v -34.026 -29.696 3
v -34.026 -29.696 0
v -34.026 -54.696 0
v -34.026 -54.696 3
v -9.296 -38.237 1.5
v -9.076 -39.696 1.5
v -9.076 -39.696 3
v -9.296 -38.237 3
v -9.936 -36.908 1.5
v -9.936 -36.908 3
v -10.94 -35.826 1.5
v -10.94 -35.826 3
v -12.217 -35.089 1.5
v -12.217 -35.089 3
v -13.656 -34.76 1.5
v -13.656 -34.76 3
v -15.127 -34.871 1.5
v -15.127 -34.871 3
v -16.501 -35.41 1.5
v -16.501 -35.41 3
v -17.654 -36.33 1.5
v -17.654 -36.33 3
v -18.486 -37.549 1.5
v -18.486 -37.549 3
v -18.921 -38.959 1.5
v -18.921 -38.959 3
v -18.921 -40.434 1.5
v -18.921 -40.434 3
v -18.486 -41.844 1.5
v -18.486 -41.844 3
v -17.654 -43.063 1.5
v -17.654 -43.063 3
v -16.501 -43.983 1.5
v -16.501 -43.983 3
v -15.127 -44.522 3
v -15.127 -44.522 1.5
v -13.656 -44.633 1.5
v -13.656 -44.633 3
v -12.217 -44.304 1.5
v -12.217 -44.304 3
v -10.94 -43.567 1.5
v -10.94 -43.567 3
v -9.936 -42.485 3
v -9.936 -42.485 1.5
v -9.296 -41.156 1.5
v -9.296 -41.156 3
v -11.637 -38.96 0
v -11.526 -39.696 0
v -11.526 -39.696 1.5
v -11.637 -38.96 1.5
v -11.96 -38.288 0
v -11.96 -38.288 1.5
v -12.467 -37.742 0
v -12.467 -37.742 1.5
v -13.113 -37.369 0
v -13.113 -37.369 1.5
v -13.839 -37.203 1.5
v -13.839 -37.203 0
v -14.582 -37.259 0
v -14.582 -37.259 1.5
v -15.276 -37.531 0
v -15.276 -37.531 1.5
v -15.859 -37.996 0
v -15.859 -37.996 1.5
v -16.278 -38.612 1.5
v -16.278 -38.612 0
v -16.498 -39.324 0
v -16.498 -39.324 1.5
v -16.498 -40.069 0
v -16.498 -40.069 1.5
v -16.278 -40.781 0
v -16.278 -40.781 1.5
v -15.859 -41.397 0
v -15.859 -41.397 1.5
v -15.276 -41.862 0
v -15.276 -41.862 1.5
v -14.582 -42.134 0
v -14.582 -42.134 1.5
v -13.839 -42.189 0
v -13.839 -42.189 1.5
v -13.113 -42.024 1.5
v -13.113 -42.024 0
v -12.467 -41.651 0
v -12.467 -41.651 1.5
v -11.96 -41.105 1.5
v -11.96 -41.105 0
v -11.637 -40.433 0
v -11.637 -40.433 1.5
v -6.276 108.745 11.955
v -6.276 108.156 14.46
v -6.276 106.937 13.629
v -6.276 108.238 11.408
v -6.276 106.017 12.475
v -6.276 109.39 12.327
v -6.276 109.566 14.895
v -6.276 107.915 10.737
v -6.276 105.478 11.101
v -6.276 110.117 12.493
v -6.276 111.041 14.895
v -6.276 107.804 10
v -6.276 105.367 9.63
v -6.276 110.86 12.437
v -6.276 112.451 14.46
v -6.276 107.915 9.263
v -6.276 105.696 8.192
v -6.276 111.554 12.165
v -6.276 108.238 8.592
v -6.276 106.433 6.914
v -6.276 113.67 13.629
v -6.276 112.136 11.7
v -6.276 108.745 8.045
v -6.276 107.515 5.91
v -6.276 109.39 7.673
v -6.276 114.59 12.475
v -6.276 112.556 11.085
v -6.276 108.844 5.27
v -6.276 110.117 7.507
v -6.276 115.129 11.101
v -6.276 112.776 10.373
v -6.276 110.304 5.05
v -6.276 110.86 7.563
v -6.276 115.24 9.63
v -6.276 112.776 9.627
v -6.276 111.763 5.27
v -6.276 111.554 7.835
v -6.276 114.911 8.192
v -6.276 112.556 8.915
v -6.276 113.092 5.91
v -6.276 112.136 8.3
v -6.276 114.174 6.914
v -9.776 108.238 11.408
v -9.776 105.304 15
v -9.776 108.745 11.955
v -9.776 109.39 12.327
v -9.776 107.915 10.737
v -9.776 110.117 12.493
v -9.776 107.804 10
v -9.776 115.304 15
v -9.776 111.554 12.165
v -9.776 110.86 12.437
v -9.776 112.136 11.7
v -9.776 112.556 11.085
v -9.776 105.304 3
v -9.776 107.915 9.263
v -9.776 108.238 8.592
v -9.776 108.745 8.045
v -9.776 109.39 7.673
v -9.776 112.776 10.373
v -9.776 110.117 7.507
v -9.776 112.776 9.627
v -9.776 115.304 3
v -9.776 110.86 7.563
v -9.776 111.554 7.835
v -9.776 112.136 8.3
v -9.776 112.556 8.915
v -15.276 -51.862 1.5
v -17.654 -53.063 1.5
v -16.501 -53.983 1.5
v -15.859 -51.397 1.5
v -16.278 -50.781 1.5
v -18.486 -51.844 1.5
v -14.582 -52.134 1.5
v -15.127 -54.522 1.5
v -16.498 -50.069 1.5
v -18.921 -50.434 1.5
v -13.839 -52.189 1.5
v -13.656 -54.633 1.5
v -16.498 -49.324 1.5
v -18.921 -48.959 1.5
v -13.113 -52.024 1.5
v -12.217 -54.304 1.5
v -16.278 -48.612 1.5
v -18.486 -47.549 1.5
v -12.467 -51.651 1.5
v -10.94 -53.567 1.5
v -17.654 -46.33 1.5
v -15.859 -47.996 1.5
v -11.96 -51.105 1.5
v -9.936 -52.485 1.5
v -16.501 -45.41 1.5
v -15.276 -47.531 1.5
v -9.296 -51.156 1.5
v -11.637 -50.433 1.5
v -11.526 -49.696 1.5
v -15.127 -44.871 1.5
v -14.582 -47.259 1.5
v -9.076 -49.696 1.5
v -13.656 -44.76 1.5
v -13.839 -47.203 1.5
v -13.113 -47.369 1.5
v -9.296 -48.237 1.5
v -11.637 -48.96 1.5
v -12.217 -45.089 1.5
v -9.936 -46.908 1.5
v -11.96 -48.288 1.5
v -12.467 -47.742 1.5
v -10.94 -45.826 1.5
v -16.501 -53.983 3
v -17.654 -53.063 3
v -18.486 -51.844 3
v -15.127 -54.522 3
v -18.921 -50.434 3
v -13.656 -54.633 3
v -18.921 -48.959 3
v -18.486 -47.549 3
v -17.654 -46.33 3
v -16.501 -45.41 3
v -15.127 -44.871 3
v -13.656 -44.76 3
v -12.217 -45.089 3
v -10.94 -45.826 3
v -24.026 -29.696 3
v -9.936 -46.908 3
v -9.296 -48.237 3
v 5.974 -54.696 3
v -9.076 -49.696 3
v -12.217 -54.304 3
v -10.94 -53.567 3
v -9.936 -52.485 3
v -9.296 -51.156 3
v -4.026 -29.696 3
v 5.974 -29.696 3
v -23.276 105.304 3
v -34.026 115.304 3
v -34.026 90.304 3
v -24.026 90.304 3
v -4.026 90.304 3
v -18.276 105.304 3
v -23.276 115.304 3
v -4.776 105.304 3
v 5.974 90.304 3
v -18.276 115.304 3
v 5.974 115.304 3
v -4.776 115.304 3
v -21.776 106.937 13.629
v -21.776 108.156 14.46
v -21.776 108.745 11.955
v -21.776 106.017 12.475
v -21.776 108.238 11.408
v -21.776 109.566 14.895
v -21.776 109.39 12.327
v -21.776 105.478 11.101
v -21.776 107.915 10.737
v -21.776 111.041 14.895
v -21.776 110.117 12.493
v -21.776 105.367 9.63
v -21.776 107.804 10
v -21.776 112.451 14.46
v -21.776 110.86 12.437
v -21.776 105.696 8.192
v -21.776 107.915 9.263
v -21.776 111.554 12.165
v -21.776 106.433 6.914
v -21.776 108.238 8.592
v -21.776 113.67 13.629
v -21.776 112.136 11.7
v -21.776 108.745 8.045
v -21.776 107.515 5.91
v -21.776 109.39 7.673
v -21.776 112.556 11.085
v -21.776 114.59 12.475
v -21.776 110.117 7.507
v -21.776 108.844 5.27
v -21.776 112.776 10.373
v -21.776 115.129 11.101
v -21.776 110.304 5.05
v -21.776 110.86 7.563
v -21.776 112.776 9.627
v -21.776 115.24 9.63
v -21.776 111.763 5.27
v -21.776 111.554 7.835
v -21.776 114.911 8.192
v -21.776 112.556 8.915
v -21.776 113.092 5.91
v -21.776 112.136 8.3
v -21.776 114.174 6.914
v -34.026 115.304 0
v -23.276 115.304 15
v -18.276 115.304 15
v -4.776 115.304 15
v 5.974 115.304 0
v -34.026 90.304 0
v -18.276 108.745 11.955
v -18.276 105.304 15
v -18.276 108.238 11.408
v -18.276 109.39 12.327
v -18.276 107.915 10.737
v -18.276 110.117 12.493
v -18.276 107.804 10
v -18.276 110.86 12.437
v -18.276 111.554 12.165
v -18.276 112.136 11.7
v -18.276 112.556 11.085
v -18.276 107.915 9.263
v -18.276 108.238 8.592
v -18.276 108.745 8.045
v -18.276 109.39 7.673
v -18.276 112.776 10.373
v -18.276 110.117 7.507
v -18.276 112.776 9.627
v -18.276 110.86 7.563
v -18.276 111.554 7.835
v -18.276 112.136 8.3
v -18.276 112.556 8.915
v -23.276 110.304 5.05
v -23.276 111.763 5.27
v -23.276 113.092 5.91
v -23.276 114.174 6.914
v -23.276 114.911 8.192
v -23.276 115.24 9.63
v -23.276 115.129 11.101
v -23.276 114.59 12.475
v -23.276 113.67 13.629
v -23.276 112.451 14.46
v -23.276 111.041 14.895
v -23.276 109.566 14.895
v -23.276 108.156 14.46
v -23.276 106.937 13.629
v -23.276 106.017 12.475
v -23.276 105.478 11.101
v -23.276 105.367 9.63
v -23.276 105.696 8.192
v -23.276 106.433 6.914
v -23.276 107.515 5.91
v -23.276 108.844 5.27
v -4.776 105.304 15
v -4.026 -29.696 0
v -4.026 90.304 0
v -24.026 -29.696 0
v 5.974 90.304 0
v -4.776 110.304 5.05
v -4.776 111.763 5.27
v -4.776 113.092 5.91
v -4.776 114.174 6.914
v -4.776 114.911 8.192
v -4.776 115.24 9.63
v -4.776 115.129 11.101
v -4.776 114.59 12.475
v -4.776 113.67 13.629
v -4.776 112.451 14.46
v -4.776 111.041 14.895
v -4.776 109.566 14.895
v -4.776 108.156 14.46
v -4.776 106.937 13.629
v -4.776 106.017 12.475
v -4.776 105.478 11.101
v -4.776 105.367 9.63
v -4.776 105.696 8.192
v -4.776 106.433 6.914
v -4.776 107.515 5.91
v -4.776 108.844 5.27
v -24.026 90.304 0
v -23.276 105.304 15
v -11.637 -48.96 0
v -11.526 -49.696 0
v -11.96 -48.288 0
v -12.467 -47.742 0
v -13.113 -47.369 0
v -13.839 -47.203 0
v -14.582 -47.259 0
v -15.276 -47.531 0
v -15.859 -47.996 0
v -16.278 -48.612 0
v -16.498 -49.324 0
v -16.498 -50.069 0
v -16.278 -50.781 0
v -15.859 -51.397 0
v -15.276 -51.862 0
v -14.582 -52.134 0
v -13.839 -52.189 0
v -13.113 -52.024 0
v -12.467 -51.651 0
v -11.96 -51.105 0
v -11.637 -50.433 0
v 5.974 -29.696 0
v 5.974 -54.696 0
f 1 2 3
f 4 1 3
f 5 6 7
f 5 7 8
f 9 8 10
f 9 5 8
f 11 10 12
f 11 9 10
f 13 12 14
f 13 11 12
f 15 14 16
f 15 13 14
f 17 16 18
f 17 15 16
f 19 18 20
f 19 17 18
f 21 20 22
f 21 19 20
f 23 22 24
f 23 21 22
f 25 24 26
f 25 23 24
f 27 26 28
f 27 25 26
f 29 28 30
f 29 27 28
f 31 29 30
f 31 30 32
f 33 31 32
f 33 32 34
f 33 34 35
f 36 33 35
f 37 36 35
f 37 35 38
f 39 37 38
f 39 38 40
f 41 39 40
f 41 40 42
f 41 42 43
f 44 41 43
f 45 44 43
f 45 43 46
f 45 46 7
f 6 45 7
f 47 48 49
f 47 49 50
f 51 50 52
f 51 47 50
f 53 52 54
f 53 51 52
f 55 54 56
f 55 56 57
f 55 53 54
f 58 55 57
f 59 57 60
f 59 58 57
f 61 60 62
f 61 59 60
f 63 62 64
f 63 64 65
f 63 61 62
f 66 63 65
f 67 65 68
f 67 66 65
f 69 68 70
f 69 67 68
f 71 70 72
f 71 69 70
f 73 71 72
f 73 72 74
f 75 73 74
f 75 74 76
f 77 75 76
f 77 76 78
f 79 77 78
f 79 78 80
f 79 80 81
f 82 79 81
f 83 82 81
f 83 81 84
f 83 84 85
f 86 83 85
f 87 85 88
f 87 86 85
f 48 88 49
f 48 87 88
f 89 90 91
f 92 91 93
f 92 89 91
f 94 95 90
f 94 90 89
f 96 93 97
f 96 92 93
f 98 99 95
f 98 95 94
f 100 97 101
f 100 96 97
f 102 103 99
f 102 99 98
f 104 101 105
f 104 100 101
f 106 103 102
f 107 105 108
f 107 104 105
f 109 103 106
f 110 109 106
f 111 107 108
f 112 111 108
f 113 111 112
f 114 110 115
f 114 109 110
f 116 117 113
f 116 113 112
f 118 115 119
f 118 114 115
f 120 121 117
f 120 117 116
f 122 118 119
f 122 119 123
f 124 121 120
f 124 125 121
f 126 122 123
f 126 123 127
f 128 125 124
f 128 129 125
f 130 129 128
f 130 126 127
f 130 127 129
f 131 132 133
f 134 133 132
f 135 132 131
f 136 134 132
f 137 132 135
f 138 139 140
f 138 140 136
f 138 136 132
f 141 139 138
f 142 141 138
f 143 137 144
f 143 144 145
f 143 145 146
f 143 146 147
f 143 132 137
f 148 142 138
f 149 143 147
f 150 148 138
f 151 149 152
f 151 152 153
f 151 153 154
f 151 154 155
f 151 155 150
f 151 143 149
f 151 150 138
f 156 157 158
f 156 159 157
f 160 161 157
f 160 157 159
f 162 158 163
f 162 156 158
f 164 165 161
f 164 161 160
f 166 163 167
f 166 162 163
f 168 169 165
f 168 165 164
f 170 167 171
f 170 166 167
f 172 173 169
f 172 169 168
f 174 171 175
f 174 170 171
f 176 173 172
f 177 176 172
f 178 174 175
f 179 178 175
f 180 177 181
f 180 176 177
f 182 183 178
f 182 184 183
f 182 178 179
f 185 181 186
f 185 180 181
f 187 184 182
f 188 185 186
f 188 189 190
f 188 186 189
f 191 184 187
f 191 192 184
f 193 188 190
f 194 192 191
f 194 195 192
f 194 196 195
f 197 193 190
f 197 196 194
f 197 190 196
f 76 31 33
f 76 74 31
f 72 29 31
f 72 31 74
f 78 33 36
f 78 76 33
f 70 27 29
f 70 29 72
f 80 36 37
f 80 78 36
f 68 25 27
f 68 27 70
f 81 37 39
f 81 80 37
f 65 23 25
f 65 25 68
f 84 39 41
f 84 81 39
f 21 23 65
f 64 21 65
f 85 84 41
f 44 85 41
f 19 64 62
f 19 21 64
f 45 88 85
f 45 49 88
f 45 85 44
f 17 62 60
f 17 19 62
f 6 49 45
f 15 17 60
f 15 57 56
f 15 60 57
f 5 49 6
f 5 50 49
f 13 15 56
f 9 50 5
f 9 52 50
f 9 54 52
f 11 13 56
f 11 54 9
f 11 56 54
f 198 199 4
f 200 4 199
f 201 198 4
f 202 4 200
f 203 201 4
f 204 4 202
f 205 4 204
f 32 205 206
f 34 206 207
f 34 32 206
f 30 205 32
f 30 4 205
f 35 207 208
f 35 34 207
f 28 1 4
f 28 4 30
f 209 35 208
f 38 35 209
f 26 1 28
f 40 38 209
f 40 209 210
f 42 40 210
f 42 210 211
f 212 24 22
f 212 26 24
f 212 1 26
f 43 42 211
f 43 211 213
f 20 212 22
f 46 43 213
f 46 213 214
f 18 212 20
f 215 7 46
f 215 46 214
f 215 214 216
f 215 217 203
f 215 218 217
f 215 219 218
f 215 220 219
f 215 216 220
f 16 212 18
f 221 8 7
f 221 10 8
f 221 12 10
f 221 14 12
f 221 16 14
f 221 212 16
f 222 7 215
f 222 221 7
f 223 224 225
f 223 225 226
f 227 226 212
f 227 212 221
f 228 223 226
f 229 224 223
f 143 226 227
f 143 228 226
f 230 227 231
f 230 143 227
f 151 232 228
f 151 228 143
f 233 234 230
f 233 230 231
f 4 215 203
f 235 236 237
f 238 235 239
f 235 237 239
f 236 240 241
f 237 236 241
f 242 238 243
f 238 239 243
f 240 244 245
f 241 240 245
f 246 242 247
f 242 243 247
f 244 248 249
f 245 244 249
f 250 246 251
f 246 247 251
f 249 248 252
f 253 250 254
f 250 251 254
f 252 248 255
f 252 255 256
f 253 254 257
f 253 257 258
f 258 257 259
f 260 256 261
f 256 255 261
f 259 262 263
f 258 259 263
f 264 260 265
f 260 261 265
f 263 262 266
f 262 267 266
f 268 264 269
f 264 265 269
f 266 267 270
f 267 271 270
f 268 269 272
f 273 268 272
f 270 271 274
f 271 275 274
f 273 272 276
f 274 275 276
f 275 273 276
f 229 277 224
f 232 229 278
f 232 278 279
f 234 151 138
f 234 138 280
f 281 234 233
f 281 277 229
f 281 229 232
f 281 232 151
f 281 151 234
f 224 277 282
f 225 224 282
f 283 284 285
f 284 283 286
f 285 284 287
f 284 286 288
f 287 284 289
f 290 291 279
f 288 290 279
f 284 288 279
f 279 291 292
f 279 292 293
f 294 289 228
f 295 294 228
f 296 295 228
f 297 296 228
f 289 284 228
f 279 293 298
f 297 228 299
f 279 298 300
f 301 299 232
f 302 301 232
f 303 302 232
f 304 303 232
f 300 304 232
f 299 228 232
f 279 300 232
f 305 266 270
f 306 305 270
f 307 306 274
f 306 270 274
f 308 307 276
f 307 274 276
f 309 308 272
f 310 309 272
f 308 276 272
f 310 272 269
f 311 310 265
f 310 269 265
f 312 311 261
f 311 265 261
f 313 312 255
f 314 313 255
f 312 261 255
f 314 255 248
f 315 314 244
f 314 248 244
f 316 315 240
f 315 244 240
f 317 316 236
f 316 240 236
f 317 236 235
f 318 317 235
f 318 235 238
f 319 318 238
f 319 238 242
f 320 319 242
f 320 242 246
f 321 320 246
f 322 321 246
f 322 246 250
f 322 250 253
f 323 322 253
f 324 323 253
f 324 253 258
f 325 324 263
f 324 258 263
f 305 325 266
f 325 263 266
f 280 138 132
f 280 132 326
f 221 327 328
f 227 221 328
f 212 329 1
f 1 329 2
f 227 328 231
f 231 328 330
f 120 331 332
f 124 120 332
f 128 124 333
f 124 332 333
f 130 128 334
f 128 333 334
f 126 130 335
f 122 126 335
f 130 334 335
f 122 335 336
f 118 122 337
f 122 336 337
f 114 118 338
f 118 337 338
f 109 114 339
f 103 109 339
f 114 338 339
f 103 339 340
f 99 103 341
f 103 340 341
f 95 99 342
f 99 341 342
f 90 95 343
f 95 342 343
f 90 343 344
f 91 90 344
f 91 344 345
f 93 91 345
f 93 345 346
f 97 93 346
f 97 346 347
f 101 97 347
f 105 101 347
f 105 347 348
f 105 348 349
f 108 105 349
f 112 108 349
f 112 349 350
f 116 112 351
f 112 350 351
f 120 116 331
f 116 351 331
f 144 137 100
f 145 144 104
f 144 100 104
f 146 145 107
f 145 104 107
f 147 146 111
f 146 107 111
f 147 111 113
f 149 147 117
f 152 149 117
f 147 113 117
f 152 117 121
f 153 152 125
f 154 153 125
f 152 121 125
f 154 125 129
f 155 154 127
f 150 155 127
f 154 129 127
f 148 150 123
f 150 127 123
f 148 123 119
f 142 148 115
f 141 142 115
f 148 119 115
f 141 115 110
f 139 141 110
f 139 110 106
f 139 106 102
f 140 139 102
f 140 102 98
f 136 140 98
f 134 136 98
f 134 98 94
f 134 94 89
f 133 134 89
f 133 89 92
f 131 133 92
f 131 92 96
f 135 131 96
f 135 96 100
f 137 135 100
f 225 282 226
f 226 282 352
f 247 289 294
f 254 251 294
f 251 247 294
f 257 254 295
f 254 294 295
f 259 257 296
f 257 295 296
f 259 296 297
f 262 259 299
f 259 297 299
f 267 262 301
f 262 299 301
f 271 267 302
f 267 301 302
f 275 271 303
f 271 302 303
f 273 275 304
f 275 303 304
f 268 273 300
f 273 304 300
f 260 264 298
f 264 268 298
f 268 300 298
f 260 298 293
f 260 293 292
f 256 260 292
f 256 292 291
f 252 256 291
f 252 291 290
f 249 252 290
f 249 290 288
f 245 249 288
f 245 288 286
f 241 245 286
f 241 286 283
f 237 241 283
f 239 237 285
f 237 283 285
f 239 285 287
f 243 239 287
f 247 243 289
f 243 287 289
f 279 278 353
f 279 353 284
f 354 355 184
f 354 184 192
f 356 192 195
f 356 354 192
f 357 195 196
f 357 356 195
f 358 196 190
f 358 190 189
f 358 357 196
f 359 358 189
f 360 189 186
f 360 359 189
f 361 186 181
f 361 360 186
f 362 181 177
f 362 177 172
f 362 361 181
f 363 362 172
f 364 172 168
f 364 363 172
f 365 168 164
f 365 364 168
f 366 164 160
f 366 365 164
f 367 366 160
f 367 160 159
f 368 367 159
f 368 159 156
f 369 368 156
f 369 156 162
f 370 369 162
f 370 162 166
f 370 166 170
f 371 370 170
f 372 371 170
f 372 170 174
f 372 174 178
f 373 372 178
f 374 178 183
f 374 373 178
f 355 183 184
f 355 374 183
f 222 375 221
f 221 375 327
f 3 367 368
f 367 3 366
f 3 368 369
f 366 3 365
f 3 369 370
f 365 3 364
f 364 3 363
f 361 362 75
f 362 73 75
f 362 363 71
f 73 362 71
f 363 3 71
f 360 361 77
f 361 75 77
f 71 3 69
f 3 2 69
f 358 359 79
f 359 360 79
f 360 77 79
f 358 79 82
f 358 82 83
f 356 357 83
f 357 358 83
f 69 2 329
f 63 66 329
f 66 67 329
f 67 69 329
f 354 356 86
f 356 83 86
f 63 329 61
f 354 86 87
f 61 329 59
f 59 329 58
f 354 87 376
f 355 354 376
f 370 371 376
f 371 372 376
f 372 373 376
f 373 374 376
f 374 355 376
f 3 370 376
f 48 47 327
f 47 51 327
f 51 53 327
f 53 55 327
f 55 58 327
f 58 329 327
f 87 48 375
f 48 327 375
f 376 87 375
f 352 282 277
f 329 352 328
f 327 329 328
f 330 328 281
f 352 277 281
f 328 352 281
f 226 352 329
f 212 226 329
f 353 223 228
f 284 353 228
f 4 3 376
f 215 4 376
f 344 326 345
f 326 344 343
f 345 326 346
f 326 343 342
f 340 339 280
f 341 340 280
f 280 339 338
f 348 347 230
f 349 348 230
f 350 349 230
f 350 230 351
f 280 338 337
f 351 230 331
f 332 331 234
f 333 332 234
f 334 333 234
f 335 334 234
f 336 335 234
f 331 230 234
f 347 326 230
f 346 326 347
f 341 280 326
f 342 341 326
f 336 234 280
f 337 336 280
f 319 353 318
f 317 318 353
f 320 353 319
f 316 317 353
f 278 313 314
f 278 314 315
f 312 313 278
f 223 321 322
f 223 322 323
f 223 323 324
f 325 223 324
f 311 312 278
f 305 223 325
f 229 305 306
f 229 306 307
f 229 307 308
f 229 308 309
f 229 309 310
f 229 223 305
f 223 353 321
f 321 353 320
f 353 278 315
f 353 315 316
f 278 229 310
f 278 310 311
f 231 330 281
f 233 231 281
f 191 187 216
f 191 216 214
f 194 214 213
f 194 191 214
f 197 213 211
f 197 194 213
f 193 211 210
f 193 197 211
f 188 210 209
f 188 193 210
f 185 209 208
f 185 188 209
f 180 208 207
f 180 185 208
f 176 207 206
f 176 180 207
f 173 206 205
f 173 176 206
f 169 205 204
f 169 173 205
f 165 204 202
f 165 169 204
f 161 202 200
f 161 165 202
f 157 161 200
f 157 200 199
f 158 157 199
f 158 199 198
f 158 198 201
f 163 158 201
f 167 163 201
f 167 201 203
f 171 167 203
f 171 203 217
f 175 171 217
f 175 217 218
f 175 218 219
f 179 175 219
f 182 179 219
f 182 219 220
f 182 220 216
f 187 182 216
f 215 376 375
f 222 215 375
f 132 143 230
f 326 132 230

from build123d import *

# Parameters (mm, degrees)
SKETCH1_R             = 4.95
SKETCH1_W             = 5
SKETCH1_H             = 10
SKETCH1_W_2           = 8.5
BODY_DEPTH            = 3
SKETCH1_3_R           = 4.95
SKETCH1_3_R_2         = 2.5
MOUNT_INSETS_DEPTH    = 1.5
SKETCH1_5_W           = 5
SKETCH1_5_H           = 10
HINGE_DEPTH           = 15
SKETCH2_R             = 4.95
SKETCH2_R_2           = 2.5
HINGE_INSET_DEPTH     = 1.5
HINGE_START           = -17
SKETCH2_2_R           = 4.95
SKETCH2_2_R_2         = 2.5
HINGE_INSET2_DEPTH    = 1.5
SKETCH2_3_R           = 2.5
HINGE_SCREWHOLE_DEPTH = 120.897733068


with BuildPart() as part:
    # Sketch1 → Body (new body)
    # profile 1 of 4: a face of its own
    with BuildSketch(Plane.XY):
        Polygon((-23.27588231, 115.303529412), (-34.02588231, 115.303529412), (-34.02588231, 90.303529412), (-24.02588231, 90.303529412), (-24.02588231, -29.696470588), (-34.02588231, -29.696470588), (-34.02588231, -54.696470588), (5.97411769, -54.696470588), (5.97411769, -29.696470588), (-4.02588231, -29.696470588), (-4.02588231, 90.303529412), (5.97411769, 90.303529412), (5.97411769, 115.303529412), (-4.77588231, 115.303529412), (-4.77588231, 105.303529412), (-9.77588231, 105.303529412), (-18.27588231, 105.303529412), (-23.27588231, 105.303529412), align=None)
        with Locations((-14.02588231, -49.696470588)):
            Circle(SKETCH1_R, mode=Mode.SUBTRACT)
        with Locations((-14.02588231, -39.696470588)):
            Circle(SKETCH1_R, mode=Mode.SUBTRACT)
    # profile 2 of 4: a face of its own
    with BuildSketch(Plane.XY):
        with Locations((-20.77588231, 110.303529412)):
            Rectangle(SKETCH1_W, SKETCH1_H)
    # profile 3 of 4: a face of its own
    with BuildSketch(Plane.XY):
        with Locations((-14.02588231, 110.303529412)):
            Rectangle(SKETCH1_W_2, SKETCH1_H)
    # profile 4 of 4: a face of its own
    with BuildSketch(Plane.XY):
        with Locations((-7.27588231, 110.303529412)):
            Rectangle(SKETCH1_W, SKETCH1_H)
    extrude(amount=BODY_DEPTH)

    # Sketch1<3> → Mount Insets (add)
    # profile 1 of 2: a face of its own
    with BuildSketch(Plane.XY):
        with Locations((-14.02588231, -39.696470588)):
            Circle(SKETCH1_3_R)
        with Locations((-14.02588231, -39.696470588)):
            Circle(SKETCH1_3_R_2, mode=Mode.SUBTRACT)
    # profile 2 of 2: a face of its own
    with BuildSketch(Plane.XY):
        with Locations((-14.02588231, -49.696470588)):
            Circle(SKETCH1_3_R)
        with Locations((-14.02588231, -49.696470588)):
            Circle(SKETCH1_3_R_2, mode=Mode.SUBTRACT)
    extrude(amount=MOUNT_INSETS_DEPTH)

    # Sketch1<5> → Hinge (add)
    with BuildSketch(Plane.XY):
        with Locations((-7.27588231, 110.303529412)):
            Rectangle(SKETCH1_5_W, SKETCH1_5_H)
        with Locations((-20.77588231, 110.303529412)):
            Rectangle(SKETCH1_5_W, SKETCH1_5_H)
    extrude(amount=HINGE_DEPTH)

    # Sketch2 → Hinge Inset (cut)
    with BuildSketch(Plane(origin=(-4.77588231, 0, 0), x_dir=(0, 0, -1), z_dir=(1, 0, 0))):
        with Locations((-10, 110.303529412)):
            Circle(SKETCH2_R)
        with Locations((-10, 110.303529412)):
            Circle(SKETCH2_R_2, mode=Mode.SUBTRACT)
    extrude(amount=-HINGE_INSET_DEPTH, mode=Mode.SUBTRACT)

    # Sketch2<2> → Hinge Inset2 (cut)
    with BuildSketch(Plane(origin=(-4.77588231, 0, 0), x_dir=(0, 0, -1), z_dir=(1, 0, 0)).offset(HINGE_START)):
        with Locations((-10, 110.303529412)):
            Circle(SKETCH2_2_R)
        with Locations((-10, 110.303529412)):
            Circle(SKETCH2_2_R_2, mode=Mode.SUBTRACT)
    extrude(amount=-HINGE_INSET2_DEPTH, mode=Mode.SUBTRACT)

    # Sketch2<3> → Hinge Screwhole (cut, through all)
    with BuildSketch(Plane(origin=(-4.77588231, 0, 0), x_dir=(0, 0, -1), z_dir=(1, 0, 0))):
        with Locations(Location((-10, 110.303529412, 0), (0, 0, 270))):
            Circle(SKETCH2_3_R)
    extrude(amount=-HINGE_SCREWHOLE_DEPTH, mode=Mode.SUBTRACT)


solid = part.part
